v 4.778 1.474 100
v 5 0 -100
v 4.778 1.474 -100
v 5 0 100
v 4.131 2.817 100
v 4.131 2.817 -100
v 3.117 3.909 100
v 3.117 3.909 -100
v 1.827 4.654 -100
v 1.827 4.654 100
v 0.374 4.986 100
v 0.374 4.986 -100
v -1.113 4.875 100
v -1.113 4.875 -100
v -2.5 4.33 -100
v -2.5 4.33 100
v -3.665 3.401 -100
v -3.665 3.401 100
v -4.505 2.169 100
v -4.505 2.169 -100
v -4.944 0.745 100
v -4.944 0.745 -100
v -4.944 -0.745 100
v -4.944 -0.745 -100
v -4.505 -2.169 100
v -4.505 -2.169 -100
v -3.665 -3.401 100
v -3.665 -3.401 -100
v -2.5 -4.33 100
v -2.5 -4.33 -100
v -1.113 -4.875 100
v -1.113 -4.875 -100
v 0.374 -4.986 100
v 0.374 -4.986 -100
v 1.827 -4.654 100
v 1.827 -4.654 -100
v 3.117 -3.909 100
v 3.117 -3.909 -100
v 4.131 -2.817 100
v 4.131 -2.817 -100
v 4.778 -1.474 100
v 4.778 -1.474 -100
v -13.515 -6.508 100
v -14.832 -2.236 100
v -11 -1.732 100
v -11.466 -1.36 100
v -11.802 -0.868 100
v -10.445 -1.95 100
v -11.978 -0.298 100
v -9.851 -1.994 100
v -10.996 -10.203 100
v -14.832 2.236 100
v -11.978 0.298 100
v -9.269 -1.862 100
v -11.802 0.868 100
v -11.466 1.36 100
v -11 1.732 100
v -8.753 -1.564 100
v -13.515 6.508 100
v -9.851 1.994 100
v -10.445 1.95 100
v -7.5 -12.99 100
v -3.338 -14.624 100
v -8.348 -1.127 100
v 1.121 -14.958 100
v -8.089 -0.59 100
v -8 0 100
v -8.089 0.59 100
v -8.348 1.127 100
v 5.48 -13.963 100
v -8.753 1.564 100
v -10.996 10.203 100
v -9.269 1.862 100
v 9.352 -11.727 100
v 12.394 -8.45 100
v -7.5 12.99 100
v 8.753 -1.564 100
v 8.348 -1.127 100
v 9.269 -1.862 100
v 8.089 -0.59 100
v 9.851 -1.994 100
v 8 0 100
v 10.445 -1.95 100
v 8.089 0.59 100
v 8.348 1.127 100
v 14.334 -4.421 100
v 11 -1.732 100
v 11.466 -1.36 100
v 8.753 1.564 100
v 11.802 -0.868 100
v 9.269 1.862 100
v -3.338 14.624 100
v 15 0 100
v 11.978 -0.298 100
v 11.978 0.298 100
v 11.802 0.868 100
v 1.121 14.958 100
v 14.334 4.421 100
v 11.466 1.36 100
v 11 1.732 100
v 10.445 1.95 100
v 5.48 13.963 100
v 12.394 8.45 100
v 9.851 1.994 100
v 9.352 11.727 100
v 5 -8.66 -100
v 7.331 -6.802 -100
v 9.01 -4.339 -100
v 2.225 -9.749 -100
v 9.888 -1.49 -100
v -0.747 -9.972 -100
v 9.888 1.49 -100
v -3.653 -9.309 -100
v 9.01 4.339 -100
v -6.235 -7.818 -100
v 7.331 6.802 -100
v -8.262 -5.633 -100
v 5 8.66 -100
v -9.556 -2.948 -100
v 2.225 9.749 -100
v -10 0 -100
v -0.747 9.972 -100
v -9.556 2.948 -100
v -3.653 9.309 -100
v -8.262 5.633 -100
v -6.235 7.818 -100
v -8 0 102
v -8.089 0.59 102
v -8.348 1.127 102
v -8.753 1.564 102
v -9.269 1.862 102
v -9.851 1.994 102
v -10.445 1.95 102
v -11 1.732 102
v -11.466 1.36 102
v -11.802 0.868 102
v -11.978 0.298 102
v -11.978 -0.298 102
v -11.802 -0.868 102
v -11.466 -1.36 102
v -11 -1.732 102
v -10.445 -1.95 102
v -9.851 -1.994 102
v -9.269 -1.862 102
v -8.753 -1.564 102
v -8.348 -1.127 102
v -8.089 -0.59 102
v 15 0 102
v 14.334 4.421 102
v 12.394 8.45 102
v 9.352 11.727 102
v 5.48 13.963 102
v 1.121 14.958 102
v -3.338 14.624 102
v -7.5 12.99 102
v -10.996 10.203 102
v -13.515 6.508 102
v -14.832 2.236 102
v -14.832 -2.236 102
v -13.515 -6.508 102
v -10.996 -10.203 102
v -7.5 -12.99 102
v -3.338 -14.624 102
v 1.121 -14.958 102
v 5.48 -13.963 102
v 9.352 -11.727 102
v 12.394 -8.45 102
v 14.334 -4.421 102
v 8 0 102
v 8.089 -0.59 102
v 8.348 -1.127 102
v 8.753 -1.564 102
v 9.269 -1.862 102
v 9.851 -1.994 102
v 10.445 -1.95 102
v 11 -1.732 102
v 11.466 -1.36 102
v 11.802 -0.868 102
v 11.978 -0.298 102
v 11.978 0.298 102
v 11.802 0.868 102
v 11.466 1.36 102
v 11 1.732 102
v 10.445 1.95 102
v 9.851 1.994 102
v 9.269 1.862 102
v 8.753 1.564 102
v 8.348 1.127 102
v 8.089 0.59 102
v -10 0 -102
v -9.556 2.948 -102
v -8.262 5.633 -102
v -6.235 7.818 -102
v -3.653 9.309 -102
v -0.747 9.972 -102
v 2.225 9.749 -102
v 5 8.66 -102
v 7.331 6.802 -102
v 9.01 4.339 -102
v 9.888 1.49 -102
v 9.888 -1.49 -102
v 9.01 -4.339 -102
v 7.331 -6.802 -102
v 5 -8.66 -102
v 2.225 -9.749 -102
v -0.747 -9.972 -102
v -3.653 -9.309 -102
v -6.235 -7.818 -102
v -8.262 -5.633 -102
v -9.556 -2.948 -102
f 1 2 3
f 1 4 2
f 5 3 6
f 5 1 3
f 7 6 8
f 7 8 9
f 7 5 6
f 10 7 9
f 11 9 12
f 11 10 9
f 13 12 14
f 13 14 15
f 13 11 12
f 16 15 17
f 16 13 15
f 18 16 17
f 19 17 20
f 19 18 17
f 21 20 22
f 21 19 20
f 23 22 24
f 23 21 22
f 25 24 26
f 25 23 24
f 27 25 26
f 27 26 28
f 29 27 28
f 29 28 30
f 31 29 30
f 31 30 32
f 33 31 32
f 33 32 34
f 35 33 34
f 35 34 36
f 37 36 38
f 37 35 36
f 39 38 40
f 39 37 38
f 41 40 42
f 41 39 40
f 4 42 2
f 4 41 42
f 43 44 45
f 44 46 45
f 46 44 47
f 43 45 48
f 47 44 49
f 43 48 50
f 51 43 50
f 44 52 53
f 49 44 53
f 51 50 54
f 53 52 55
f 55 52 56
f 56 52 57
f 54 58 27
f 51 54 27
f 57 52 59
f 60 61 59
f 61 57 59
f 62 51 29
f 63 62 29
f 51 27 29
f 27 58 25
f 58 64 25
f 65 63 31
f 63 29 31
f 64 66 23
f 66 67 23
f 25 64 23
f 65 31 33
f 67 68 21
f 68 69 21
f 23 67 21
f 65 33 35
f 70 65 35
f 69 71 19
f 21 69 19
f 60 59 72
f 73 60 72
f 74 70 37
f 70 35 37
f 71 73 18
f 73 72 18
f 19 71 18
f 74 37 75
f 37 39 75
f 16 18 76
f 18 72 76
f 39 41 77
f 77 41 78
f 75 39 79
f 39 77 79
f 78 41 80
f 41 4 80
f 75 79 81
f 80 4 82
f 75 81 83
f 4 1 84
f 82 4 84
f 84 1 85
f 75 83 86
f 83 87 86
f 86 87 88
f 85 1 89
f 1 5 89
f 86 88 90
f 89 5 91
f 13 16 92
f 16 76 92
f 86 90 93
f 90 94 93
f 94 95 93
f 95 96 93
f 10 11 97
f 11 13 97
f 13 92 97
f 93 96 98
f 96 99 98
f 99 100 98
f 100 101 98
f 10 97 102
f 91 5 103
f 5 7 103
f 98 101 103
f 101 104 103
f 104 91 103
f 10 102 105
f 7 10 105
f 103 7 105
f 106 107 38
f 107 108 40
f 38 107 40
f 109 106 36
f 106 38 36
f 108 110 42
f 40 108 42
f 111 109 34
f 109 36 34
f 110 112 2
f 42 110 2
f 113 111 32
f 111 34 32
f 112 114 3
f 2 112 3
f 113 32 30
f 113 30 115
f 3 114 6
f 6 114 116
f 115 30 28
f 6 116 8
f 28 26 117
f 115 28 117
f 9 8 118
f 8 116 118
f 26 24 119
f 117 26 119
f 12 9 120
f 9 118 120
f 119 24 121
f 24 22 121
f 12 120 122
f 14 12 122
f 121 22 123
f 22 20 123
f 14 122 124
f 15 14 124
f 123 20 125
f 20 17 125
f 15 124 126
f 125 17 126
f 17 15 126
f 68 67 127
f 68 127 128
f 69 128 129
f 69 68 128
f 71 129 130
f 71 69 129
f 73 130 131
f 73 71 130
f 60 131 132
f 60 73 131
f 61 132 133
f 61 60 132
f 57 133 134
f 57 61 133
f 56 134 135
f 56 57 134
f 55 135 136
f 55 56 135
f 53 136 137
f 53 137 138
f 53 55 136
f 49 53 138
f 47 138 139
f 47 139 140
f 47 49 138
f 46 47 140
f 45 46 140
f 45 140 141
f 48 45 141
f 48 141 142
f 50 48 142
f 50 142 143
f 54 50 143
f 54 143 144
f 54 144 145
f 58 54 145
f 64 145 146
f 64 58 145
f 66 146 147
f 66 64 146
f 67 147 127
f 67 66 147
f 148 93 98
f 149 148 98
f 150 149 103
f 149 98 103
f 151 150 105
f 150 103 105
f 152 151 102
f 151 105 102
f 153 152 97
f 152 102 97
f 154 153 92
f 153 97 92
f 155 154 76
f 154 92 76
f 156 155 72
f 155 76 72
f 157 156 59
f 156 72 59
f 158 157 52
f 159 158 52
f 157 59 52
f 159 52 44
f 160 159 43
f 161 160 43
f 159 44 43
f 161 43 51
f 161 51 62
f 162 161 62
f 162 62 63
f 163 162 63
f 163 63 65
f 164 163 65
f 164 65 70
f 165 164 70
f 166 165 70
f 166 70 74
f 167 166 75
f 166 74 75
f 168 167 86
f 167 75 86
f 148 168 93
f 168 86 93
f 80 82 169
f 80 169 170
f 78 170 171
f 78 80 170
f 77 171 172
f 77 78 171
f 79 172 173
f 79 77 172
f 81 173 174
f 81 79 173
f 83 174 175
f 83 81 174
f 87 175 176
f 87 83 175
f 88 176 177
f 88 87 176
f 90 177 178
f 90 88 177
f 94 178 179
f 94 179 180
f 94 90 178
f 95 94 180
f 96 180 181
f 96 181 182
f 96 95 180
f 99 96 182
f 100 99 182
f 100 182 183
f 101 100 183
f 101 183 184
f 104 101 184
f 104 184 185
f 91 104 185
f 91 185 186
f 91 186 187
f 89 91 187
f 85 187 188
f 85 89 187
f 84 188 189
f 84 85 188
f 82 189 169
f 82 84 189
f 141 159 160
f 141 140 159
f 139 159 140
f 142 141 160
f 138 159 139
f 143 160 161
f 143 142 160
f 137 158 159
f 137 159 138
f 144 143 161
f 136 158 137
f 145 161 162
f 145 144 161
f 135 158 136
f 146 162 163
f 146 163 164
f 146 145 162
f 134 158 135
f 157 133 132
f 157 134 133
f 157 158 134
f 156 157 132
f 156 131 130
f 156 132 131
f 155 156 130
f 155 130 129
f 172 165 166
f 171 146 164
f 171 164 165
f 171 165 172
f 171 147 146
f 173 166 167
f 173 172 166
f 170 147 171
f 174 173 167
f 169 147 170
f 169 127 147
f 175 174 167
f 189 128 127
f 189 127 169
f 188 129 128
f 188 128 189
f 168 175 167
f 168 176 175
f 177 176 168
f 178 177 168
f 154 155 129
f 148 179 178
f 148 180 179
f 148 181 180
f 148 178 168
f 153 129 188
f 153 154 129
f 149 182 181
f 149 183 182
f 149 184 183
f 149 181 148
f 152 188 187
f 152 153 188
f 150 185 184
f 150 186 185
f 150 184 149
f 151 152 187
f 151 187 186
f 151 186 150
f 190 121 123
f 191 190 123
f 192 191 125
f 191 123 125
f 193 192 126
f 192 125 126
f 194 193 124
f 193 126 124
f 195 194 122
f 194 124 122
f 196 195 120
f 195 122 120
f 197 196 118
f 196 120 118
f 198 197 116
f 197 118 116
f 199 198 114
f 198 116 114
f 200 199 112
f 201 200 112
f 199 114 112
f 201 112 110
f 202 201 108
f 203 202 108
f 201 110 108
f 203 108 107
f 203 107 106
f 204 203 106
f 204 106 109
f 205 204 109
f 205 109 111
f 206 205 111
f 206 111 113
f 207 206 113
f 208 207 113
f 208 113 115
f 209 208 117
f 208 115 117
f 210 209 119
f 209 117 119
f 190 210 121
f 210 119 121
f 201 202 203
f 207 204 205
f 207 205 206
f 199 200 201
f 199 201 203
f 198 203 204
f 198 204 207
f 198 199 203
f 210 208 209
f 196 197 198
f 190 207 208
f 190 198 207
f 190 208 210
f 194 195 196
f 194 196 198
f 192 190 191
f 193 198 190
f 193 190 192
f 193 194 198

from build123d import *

# Parameters (mm, degrees)
SKETCH_1_R      = 5
EXTRUDE_1_DEPTH = 100
SKETCH_2_R      = 10
EXTRUDE_2_DEPTH = 2
SKETCH_3_R      = 15
SKETCH_3_R_2    = 2
EXTRUDE_3_DEPTH = 2


with BuildPart() as part:
    # 草图1 → 凸台-拉伸1 (new, symmetric)
    with BuildSketch(Plane.XY):
        Circle(SKETCH_1_R)
    extrude(amount=EXTRUDE_1_DEPTH, both=True)

    # 草图2 → 凸台-拉伸2 (add)
    with BuildSketch(Plane(origin=(0, 0, -100), x_dir=(-1, 0, 0), z_dir=(0, 0, -1))):
        Circle(SKETCH_2_R)
    extrude(amount=EXTRUDE_2_DEPTH)

    # 草图3 → 凸台-拉伸3 (add)
    with BuildSketch(Plane.XY.offset(100)):
        Circle(SKETCH_3_R)
        with Locations((-10, 0)):
            Circle(SKETCH_3_R_2, mode=Mode.SUBTRACT)
        with Locations(Location((10, 0, 0), (0, 0, 180))):
            Circle(SKETCH_3_R_2, mode=Mode.SUBTRACT)
    extrude(amount=EXTRUDE_3_DEPTH)


solid = part.part
